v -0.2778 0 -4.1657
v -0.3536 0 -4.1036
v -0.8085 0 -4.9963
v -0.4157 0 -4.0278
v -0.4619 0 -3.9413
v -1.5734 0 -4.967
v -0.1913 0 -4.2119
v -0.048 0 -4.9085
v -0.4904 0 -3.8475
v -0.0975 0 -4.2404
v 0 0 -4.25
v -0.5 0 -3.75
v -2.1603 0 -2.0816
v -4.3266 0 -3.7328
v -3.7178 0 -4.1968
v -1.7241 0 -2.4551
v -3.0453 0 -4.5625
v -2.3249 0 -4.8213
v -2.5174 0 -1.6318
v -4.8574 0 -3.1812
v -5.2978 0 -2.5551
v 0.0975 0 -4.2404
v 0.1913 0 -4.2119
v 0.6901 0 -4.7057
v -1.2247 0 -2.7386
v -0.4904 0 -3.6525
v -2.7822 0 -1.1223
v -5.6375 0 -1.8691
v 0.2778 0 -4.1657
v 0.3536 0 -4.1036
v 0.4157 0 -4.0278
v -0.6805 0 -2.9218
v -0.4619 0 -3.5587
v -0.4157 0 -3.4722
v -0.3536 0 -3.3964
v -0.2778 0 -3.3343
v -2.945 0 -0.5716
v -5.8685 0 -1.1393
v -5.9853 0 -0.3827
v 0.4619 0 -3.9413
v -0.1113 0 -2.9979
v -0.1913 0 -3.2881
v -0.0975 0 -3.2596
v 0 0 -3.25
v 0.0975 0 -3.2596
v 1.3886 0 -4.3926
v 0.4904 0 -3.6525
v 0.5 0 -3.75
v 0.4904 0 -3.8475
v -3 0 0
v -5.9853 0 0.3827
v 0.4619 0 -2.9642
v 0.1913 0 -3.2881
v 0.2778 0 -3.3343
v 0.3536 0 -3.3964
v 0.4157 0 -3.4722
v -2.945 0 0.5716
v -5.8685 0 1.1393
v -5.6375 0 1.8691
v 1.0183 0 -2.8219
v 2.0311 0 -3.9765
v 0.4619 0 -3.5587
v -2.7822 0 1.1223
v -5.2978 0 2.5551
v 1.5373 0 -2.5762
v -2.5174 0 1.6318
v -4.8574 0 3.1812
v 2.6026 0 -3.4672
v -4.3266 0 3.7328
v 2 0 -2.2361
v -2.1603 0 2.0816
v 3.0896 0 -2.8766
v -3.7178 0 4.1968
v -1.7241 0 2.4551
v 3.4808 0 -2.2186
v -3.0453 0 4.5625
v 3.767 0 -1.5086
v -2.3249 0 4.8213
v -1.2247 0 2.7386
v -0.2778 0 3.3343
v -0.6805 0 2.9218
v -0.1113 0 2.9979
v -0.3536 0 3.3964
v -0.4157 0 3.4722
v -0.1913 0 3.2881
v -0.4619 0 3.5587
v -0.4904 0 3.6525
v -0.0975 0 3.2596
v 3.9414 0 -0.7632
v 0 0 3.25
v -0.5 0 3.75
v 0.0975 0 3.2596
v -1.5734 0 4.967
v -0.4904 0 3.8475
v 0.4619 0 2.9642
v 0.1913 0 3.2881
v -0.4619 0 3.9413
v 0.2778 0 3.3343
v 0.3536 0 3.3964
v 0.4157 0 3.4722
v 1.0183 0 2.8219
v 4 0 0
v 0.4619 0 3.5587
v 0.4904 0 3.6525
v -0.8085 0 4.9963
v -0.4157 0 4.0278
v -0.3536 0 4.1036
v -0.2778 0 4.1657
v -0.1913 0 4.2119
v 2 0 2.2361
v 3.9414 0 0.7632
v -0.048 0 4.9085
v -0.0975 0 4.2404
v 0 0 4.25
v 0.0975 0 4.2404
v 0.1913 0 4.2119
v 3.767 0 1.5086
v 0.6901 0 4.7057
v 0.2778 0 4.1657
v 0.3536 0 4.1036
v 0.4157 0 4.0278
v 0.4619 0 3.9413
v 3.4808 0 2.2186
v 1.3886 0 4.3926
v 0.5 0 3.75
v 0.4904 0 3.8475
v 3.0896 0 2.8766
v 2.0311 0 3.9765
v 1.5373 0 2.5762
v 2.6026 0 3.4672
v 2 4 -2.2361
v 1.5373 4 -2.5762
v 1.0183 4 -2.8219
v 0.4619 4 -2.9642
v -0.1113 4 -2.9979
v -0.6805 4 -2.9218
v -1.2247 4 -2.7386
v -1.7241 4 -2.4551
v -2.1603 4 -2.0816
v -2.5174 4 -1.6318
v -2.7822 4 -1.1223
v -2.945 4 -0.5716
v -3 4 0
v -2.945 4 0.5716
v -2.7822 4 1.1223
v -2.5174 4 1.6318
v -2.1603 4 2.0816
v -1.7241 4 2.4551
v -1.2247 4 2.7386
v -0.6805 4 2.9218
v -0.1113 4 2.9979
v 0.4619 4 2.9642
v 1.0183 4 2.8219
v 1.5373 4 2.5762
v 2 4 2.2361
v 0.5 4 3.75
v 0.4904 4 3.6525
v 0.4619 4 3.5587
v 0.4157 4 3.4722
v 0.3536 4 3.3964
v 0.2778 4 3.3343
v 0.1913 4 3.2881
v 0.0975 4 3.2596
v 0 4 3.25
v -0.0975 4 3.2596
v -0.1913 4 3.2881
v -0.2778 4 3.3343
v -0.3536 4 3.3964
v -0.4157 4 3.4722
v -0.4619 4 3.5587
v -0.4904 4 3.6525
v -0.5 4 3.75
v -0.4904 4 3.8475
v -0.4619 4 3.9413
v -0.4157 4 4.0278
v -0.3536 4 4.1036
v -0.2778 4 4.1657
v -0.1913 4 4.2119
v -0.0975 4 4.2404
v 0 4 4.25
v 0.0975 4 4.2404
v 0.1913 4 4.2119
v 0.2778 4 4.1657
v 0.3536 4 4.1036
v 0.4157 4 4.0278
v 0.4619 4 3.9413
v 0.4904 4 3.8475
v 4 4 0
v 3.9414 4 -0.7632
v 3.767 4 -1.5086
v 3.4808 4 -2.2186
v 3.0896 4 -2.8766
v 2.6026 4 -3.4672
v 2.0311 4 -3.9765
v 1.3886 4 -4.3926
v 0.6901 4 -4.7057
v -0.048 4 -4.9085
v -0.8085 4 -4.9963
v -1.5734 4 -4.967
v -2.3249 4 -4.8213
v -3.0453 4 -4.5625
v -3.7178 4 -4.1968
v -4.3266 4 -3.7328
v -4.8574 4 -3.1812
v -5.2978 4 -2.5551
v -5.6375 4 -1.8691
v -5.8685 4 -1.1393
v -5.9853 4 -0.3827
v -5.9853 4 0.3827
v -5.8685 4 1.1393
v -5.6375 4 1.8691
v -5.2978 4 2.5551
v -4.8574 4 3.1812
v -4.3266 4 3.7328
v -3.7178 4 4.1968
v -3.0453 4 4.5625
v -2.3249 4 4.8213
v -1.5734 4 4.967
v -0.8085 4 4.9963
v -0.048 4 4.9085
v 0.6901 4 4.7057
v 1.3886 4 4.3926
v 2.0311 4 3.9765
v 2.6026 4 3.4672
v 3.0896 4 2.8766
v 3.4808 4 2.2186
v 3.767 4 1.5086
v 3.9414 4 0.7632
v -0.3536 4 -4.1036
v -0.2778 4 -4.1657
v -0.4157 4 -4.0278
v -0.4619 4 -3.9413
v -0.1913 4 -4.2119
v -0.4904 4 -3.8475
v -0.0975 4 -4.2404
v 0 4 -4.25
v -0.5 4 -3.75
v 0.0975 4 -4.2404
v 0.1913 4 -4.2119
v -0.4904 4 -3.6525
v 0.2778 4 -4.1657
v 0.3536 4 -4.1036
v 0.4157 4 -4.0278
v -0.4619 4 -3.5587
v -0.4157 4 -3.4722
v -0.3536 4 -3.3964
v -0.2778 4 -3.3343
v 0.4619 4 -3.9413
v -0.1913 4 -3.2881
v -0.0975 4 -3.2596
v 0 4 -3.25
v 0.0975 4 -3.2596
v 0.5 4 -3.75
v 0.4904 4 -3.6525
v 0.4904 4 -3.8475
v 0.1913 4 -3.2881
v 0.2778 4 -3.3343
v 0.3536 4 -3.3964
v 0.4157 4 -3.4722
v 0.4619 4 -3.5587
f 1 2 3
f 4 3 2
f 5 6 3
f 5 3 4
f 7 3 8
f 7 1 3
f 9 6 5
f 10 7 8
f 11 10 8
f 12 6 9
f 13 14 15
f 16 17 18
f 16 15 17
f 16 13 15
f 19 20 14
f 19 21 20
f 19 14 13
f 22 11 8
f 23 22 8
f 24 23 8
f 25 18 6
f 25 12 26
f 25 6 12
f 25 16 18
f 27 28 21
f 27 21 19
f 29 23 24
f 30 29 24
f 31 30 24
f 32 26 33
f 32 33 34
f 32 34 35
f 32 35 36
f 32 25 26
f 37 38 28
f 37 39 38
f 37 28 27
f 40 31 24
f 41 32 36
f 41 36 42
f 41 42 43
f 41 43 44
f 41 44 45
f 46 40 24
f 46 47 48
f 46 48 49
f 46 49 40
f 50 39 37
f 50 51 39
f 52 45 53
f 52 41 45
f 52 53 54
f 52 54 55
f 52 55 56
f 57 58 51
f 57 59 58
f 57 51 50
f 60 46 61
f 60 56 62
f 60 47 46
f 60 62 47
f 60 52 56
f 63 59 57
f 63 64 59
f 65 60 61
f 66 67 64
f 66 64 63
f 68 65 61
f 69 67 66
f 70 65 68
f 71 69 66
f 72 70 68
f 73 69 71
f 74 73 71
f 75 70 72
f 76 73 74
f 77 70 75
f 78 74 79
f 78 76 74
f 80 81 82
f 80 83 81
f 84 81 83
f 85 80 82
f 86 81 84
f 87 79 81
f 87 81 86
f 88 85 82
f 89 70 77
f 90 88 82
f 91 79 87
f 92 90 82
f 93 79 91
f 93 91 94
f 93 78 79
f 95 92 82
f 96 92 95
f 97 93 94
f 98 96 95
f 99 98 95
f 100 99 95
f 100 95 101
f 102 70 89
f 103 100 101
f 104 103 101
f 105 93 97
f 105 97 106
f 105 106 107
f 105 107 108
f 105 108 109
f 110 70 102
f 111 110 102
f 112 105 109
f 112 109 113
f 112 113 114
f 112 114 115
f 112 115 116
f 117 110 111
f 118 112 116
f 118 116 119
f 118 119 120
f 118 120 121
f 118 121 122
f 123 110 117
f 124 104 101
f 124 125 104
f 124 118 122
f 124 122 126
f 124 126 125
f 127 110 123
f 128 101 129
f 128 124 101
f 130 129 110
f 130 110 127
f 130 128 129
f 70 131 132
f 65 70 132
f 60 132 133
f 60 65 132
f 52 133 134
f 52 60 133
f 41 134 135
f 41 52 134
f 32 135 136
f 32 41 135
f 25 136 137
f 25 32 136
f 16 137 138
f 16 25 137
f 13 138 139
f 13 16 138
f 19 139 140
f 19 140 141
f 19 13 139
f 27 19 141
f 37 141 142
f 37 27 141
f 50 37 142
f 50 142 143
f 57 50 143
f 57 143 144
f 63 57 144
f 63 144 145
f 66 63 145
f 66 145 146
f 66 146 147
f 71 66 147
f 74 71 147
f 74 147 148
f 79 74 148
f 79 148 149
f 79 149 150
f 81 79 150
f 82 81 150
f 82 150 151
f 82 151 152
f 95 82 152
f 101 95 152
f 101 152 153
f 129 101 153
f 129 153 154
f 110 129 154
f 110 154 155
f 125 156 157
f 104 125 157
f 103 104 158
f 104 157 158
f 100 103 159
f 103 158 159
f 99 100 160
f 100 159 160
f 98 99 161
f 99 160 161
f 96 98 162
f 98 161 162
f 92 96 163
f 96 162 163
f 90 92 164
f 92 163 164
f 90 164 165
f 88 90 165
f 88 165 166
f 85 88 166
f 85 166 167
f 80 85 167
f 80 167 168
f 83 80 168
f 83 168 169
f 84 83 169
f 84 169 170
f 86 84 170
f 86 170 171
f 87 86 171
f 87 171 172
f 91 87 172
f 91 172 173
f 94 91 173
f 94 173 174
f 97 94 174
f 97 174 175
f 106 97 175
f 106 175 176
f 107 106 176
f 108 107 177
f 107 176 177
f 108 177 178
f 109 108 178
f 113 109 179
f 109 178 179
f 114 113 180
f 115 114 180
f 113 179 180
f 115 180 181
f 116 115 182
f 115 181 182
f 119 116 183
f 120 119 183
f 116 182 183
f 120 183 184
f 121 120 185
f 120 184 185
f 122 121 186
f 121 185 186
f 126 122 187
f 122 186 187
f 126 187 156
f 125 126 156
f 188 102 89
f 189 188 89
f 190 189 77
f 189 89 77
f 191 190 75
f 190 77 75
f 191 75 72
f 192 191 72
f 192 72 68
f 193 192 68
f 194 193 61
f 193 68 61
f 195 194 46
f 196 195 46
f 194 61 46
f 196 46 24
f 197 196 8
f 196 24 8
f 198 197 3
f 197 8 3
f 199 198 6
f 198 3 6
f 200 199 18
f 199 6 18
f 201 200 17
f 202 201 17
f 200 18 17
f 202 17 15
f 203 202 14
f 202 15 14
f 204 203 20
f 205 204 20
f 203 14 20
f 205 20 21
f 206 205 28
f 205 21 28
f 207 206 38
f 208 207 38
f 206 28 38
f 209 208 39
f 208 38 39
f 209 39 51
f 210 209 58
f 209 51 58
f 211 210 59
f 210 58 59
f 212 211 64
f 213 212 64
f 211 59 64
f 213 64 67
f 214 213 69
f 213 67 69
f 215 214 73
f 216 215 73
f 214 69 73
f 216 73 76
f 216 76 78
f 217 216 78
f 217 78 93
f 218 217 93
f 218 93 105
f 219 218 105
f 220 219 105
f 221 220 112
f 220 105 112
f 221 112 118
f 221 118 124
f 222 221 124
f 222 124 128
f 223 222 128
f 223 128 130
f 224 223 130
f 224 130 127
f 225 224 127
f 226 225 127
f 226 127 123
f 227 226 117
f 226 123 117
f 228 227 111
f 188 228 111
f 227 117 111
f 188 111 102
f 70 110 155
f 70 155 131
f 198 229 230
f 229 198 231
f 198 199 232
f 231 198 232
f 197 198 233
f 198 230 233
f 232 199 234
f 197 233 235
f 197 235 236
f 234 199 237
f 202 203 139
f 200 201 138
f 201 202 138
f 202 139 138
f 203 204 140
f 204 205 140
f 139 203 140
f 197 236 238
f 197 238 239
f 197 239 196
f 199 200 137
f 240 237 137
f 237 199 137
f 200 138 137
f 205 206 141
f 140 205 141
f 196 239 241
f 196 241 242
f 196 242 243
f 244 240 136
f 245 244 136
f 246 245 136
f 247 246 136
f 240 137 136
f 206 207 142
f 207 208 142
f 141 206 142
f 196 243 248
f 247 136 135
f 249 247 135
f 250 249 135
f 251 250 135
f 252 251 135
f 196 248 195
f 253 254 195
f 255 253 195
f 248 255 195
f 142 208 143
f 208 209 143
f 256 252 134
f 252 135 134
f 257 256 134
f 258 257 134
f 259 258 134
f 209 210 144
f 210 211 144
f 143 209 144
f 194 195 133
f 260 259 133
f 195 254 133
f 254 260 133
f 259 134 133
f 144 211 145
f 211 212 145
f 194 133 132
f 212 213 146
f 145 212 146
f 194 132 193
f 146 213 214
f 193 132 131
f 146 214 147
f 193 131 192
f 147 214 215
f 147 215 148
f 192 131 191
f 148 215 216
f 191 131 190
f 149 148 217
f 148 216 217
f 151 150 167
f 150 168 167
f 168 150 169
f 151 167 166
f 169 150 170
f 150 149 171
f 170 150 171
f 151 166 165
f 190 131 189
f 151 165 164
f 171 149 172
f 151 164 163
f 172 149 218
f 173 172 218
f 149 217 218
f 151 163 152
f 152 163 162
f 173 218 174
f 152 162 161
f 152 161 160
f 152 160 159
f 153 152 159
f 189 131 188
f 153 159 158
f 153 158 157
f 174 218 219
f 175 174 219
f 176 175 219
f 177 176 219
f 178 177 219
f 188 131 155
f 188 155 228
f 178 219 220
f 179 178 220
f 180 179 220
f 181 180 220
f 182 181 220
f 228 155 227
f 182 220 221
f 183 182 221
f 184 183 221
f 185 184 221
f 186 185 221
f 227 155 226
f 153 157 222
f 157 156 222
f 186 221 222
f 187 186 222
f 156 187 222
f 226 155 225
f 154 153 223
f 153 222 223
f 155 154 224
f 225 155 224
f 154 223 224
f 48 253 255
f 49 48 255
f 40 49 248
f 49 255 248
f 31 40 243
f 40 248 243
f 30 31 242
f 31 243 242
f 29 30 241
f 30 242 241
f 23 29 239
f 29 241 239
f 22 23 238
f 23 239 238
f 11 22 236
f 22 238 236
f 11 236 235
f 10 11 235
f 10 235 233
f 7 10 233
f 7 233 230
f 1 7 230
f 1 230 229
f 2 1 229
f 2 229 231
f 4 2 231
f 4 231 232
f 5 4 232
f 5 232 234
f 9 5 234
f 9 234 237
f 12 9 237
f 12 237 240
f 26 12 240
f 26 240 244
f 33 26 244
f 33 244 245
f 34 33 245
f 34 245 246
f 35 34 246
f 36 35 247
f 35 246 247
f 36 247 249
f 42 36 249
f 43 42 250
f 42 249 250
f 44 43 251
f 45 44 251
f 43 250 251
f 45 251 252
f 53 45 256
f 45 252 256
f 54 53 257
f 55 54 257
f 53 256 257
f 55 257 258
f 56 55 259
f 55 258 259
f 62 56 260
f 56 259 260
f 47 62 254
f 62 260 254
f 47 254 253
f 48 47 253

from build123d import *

# Parameters (mm, degrees)
SKETCH1_R           = 5
SKETCH1_R_2         = 3
BOSS_EXTRUDE1_DEPTH = 4
SKETCH2_R           = 0.5
CUT_EXTRUDE1_DEPTH  = 5
BOSS_EXTRUDE2_DEPTH = 4


with BuildPart() as part:
    # Sketch1 → Boss-Extrude1 (new body)
    with BuildSketch(Plane(origin=(0, 0, 0), x_dir=(1, 0, 0), z_dir=(0, 1, 0))):
        with Locations((-1, 0)):
            Circle(SKETCH1_R)
        Circle(SKETCH1_R_2, mode=Mode.SUBTRACT)
    extrude(amount=BOSS_EXTRUDE1_DEPTH)

    # Sketch2 → Cut-Extrude1 (cut, through all)
    with BuildSketch(Plane(origin=(0, 4, 0), x_dir=(1, 0, 0), z_dir=(0, 1, 0))):
        with Locations((0, 3.75)):
            Circle(SKETCH2_R)
        with Locations((0, -3.75)):
            Circle(SKETCH2_R)
    extrude(amount=-CUT_EXTRUDE1_DEPTH, mode=Mode.SUBTRACT)

    # Sketch3 → Boss-Extrude2 (add)
    with BuildSketch(Plane.XZ):
        with BuildLine():
            ThreePointArc((3, 0), (2.738612788, 1.224744871), (2, 2.236067977))
            Line((2, 2.236067977), (2, -2.236067977))
            ThreePointArc((2, -2.236067977), (2.738612788, -1.224744871), (3, 0))
        make_face()
    extrude(amount=-BOSS_EXTRUDE2_DEPTH)


solid = part.part
